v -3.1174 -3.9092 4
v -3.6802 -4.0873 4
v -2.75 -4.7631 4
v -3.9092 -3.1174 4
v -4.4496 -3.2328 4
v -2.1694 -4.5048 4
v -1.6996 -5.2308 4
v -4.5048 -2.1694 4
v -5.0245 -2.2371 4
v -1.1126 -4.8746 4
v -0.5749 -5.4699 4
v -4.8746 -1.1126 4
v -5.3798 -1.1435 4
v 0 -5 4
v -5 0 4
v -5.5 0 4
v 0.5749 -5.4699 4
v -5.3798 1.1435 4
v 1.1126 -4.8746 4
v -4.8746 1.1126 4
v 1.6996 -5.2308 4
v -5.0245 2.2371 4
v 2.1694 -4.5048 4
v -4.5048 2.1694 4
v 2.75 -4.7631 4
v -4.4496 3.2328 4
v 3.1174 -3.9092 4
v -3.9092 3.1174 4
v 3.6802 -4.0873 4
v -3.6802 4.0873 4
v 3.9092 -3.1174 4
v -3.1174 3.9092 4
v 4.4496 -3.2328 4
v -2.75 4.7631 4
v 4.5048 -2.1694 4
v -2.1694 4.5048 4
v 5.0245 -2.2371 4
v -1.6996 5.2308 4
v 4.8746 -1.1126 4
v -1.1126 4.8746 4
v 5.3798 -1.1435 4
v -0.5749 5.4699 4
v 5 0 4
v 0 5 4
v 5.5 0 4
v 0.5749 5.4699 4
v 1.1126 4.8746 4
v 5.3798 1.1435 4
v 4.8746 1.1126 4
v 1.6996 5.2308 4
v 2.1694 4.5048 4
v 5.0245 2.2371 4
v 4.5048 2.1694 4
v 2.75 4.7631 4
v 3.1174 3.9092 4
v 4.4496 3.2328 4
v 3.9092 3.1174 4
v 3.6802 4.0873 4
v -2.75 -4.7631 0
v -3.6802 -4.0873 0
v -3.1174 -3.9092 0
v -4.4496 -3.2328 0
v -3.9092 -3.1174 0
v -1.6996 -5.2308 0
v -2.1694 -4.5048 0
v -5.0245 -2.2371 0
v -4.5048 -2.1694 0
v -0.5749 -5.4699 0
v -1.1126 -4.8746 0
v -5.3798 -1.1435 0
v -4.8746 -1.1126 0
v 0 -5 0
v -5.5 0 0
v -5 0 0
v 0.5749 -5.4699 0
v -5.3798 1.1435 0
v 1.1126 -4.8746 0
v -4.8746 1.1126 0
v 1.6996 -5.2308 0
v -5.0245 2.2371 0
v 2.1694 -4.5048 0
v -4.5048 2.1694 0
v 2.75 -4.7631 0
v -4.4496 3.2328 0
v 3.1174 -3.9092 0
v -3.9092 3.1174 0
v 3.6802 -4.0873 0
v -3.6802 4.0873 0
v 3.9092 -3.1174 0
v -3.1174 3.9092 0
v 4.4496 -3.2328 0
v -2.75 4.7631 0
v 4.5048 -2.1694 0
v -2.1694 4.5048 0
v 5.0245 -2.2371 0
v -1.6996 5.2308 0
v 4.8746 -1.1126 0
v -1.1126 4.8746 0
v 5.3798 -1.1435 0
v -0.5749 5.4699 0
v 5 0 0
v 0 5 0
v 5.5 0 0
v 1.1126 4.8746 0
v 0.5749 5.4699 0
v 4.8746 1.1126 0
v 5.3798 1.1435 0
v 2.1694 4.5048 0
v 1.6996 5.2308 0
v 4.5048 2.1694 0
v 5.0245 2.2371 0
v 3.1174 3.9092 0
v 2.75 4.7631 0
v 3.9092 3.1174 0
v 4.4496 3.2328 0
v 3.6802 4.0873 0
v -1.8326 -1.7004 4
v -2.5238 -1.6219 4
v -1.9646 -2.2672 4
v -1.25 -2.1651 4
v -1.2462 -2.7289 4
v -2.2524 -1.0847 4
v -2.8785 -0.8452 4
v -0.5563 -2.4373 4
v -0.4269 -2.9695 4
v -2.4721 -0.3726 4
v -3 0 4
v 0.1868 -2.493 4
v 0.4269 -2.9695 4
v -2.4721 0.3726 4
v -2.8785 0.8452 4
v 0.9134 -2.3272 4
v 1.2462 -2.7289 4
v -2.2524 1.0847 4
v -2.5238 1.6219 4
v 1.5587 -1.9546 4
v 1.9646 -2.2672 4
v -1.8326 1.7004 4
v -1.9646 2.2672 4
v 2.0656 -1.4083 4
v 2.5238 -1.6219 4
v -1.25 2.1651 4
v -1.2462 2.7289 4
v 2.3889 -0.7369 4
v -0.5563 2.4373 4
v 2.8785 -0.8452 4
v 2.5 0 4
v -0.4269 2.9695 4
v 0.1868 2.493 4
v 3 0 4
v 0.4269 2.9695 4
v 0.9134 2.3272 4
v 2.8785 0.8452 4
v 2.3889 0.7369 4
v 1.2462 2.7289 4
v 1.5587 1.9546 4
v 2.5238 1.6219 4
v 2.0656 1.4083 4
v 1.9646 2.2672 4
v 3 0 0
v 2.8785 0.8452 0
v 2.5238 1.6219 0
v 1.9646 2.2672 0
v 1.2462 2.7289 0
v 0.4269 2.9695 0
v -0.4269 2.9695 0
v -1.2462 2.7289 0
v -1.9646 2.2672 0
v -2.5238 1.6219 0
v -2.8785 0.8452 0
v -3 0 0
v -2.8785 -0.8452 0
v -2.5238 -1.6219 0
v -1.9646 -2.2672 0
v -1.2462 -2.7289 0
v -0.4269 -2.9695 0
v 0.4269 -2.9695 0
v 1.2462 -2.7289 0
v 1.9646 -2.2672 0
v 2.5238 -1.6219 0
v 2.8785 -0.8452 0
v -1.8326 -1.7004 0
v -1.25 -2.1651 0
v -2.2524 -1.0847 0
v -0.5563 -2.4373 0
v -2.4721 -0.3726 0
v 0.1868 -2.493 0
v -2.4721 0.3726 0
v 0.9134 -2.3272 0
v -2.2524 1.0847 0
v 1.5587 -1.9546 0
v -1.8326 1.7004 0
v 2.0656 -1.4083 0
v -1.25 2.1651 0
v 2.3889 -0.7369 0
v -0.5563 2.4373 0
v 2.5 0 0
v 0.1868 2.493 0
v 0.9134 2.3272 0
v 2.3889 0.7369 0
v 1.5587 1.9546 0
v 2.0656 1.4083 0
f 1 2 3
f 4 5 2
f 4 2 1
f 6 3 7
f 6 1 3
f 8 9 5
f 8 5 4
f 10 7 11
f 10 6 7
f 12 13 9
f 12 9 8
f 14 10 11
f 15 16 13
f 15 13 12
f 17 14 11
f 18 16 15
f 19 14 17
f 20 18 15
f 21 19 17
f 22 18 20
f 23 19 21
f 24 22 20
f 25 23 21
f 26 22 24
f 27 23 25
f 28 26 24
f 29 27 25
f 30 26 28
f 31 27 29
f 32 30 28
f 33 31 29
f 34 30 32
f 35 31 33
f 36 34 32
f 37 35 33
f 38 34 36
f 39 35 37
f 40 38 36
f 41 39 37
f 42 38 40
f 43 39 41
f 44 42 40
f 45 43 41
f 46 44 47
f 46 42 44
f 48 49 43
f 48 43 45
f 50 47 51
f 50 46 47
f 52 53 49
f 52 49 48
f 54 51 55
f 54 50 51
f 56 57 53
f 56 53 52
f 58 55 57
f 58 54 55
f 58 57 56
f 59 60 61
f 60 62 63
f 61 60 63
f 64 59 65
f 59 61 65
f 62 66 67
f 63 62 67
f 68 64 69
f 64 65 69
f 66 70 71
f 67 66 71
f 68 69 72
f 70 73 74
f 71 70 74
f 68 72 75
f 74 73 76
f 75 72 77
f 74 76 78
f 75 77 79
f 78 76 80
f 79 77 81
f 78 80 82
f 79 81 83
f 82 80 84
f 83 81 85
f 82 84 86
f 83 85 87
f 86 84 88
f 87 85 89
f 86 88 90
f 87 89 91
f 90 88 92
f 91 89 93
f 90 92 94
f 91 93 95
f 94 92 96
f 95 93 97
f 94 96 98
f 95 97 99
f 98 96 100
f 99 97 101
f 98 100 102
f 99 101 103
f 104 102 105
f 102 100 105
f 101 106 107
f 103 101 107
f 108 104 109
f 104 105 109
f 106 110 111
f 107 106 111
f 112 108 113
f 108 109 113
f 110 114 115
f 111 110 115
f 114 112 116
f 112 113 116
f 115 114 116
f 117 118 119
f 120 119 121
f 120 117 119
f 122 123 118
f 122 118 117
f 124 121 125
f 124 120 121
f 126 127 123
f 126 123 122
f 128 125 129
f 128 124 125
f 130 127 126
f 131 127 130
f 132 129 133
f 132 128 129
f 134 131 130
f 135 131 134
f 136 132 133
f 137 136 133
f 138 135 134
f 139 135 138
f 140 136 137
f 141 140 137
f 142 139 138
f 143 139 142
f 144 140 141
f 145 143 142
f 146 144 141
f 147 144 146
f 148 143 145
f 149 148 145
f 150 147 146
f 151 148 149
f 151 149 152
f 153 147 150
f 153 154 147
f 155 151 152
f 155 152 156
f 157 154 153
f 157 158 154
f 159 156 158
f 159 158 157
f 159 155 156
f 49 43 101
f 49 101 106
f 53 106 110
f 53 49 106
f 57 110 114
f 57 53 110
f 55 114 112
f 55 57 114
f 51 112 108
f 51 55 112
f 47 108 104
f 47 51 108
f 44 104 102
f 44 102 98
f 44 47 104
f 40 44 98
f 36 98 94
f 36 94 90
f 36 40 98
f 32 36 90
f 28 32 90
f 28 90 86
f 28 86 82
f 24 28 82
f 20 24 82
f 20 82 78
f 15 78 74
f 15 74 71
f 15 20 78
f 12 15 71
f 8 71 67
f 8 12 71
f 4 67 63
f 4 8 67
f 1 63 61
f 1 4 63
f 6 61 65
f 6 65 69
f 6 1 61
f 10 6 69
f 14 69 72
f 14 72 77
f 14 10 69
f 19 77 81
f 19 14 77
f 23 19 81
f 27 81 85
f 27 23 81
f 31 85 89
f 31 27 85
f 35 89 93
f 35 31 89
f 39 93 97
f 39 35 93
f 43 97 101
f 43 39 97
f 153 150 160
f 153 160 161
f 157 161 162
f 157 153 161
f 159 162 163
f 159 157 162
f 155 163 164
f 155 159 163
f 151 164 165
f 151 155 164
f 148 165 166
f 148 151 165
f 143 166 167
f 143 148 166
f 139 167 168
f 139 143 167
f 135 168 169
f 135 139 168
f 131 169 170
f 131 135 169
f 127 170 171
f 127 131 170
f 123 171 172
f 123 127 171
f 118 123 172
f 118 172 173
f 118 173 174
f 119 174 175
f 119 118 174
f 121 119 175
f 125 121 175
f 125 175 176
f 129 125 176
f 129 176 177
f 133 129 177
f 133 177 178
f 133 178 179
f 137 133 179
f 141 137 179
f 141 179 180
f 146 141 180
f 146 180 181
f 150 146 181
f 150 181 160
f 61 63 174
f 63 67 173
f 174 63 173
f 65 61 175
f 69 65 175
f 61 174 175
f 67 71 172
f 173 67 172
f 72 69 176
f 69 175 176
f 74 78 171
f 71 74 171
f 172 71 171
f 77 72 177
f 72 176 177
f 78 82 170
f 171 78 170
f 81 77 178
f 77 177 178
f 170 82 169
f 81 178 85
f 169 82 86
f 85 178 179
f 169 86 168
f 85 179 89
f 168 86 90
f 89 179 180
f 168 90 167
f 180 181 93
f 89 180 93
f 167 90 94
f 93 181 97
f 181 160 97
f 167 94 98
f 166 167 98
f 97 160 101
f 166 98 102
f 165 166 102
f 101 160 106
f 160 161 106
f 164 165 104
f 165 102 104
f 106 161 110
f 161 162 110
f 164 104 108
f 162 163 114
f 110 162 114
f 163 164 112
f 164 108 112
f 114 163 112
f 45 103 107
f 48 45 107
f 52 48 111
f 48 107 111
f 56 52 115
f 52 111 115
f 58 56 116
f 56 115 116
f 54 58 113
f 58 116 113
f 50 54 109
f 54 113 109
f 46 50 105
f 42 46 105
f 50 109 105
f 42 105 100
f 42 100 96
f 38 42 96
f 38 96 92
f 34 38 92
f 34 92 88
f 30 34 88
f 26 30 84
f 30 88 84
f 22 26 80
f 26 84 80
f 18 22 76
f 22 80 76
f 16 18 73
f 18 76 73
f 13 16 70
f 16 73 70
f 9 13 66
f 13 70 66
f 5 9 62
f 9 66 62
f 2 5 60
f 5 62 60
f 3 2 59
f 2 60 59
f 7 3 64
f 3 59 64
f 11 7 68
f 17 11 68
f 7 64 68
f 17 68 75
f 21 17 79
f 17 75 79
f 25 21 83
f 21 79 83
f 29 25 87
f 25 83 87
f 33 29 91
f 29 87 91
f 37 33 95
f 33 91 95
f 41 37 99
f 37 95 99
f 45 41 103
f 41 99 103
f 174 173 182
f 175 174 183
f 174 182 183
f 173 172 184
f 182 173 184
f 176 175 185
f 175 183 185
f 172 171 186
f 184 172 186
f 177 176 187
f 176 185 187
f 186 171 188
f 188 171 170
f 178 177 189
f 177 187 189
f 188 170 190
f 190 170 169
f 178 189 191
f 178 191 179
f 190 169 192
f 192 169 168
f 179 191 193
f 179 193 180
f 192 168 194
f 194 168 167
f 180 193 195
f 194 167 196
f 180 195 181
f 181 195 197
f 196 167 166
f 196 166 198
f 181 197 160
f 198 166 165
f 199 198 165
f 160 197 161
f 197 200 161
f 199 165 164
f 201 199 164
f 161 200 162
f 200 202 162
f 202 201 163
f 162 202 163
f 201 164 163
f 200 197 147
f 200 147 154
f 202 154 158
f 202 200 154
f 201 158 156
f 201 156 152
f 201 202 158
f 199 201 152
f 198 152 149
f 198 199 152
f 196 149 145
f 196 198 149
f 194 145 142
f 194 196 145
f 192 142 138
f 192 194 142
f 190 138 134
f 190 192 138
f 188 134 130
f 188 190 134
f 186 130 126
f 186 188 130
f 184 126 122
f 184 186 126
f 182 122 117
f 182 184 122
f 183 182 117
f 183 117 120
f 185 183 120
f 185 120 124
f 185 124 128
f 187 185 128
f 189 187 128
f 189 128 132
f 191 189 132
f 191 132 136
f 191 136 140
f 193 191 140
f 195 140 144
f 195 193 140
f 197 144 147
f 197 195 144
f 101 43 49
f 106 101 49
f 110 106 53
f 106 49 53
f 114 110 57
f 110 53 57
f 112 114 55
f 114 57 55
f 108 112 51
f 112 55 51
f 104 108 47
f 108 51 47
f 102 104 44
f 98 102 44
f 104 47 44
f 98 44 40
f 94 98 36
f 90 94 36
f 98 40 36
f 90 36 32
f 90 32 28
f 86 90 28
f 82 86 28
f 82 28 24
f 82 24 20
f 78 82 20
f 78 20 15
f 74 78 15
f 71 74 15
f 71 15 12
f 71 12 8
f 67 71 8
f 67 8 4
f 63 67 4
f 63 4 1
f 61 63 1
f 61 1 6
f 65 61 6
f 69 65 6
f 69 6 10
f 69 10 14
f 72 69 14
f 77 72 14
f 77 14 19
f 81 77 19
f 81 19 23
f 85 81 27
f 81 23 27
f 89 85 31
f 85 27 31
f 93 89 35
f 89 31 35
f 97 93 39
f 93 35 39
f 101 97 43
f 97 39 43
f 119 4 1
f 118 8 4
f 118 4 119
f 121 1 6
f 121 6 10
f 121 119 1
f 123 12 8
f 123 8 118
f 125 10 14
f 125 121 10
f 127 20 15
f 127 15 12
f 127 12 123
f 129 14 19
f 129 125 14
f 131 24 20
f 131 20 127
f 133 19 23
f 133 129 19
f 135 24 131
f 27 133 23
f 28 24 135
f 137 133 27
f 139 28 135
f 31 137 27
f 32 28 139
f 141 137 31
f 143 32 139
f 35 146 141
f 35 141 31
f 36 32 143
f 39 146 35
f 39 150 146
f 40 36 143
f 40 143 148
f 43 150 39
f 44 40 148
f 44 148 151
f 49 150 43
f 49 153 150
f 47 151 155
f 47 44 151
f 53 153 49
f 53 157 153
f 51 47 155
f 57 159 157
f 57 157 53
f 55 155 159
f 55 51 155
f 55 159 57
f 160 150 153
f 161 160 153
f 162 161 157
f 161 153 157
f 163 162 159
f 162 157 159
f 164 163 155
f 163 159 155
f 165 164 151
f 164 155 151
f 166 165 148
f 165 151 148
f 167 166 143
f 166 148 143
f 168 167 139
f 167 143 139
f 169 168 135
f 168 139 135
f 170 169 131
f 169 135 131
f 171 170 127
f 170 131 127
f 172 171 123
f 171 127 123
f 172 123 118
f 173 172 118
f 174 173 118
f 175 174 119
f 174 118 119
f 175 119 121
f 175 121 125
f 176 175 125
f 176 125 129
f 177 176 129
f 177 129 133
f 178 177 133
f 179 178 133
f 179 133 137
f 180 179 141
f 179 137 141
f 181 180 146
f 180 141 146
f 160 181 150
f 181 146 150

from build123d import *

# Parameters (mm, degrees)
F0_R     = 5.5
F0_R_2   = 2.5
F1_DEPTH = 4
F2_R     = 5
F2_R_2   = 3
F3_DEPTH = 4.001
F4_R     = 5
F4_R_2   = 3
F5_DEPTH = 4


with BuildPart() as f1:
    # F0 (on Top) → F1 (new body)
    with BuildSketch(Plane.XY):
        Circle(F0_R)
        Circle(F0_R_2, mode=Mode.SUBTRACT)
    extrude(amount=F1_DEPTH)

    # F2 (on face) → F3 (cut, through all)
    with BuildSketch(Plane.XY.offset(4)):
        Circle(F2_R)
        Circle(F2_R_2, mode=Mode.SUBTRACT)
    extrude(amount=-F3_DEPTH, mode=Mode.SUBTRACT)


with BuildPart() as f5:
    # F4 (on face) → F5 (new body)
    with BuildSketch(Plane.XY.offset(4)):
        Circle(F4_R)
        Circle(F4_R_2, mode=Mode.SUBTRACT)
    extrude(amount=-F5_DEPTH)


solid = Compound([f1.part, f5.part])
